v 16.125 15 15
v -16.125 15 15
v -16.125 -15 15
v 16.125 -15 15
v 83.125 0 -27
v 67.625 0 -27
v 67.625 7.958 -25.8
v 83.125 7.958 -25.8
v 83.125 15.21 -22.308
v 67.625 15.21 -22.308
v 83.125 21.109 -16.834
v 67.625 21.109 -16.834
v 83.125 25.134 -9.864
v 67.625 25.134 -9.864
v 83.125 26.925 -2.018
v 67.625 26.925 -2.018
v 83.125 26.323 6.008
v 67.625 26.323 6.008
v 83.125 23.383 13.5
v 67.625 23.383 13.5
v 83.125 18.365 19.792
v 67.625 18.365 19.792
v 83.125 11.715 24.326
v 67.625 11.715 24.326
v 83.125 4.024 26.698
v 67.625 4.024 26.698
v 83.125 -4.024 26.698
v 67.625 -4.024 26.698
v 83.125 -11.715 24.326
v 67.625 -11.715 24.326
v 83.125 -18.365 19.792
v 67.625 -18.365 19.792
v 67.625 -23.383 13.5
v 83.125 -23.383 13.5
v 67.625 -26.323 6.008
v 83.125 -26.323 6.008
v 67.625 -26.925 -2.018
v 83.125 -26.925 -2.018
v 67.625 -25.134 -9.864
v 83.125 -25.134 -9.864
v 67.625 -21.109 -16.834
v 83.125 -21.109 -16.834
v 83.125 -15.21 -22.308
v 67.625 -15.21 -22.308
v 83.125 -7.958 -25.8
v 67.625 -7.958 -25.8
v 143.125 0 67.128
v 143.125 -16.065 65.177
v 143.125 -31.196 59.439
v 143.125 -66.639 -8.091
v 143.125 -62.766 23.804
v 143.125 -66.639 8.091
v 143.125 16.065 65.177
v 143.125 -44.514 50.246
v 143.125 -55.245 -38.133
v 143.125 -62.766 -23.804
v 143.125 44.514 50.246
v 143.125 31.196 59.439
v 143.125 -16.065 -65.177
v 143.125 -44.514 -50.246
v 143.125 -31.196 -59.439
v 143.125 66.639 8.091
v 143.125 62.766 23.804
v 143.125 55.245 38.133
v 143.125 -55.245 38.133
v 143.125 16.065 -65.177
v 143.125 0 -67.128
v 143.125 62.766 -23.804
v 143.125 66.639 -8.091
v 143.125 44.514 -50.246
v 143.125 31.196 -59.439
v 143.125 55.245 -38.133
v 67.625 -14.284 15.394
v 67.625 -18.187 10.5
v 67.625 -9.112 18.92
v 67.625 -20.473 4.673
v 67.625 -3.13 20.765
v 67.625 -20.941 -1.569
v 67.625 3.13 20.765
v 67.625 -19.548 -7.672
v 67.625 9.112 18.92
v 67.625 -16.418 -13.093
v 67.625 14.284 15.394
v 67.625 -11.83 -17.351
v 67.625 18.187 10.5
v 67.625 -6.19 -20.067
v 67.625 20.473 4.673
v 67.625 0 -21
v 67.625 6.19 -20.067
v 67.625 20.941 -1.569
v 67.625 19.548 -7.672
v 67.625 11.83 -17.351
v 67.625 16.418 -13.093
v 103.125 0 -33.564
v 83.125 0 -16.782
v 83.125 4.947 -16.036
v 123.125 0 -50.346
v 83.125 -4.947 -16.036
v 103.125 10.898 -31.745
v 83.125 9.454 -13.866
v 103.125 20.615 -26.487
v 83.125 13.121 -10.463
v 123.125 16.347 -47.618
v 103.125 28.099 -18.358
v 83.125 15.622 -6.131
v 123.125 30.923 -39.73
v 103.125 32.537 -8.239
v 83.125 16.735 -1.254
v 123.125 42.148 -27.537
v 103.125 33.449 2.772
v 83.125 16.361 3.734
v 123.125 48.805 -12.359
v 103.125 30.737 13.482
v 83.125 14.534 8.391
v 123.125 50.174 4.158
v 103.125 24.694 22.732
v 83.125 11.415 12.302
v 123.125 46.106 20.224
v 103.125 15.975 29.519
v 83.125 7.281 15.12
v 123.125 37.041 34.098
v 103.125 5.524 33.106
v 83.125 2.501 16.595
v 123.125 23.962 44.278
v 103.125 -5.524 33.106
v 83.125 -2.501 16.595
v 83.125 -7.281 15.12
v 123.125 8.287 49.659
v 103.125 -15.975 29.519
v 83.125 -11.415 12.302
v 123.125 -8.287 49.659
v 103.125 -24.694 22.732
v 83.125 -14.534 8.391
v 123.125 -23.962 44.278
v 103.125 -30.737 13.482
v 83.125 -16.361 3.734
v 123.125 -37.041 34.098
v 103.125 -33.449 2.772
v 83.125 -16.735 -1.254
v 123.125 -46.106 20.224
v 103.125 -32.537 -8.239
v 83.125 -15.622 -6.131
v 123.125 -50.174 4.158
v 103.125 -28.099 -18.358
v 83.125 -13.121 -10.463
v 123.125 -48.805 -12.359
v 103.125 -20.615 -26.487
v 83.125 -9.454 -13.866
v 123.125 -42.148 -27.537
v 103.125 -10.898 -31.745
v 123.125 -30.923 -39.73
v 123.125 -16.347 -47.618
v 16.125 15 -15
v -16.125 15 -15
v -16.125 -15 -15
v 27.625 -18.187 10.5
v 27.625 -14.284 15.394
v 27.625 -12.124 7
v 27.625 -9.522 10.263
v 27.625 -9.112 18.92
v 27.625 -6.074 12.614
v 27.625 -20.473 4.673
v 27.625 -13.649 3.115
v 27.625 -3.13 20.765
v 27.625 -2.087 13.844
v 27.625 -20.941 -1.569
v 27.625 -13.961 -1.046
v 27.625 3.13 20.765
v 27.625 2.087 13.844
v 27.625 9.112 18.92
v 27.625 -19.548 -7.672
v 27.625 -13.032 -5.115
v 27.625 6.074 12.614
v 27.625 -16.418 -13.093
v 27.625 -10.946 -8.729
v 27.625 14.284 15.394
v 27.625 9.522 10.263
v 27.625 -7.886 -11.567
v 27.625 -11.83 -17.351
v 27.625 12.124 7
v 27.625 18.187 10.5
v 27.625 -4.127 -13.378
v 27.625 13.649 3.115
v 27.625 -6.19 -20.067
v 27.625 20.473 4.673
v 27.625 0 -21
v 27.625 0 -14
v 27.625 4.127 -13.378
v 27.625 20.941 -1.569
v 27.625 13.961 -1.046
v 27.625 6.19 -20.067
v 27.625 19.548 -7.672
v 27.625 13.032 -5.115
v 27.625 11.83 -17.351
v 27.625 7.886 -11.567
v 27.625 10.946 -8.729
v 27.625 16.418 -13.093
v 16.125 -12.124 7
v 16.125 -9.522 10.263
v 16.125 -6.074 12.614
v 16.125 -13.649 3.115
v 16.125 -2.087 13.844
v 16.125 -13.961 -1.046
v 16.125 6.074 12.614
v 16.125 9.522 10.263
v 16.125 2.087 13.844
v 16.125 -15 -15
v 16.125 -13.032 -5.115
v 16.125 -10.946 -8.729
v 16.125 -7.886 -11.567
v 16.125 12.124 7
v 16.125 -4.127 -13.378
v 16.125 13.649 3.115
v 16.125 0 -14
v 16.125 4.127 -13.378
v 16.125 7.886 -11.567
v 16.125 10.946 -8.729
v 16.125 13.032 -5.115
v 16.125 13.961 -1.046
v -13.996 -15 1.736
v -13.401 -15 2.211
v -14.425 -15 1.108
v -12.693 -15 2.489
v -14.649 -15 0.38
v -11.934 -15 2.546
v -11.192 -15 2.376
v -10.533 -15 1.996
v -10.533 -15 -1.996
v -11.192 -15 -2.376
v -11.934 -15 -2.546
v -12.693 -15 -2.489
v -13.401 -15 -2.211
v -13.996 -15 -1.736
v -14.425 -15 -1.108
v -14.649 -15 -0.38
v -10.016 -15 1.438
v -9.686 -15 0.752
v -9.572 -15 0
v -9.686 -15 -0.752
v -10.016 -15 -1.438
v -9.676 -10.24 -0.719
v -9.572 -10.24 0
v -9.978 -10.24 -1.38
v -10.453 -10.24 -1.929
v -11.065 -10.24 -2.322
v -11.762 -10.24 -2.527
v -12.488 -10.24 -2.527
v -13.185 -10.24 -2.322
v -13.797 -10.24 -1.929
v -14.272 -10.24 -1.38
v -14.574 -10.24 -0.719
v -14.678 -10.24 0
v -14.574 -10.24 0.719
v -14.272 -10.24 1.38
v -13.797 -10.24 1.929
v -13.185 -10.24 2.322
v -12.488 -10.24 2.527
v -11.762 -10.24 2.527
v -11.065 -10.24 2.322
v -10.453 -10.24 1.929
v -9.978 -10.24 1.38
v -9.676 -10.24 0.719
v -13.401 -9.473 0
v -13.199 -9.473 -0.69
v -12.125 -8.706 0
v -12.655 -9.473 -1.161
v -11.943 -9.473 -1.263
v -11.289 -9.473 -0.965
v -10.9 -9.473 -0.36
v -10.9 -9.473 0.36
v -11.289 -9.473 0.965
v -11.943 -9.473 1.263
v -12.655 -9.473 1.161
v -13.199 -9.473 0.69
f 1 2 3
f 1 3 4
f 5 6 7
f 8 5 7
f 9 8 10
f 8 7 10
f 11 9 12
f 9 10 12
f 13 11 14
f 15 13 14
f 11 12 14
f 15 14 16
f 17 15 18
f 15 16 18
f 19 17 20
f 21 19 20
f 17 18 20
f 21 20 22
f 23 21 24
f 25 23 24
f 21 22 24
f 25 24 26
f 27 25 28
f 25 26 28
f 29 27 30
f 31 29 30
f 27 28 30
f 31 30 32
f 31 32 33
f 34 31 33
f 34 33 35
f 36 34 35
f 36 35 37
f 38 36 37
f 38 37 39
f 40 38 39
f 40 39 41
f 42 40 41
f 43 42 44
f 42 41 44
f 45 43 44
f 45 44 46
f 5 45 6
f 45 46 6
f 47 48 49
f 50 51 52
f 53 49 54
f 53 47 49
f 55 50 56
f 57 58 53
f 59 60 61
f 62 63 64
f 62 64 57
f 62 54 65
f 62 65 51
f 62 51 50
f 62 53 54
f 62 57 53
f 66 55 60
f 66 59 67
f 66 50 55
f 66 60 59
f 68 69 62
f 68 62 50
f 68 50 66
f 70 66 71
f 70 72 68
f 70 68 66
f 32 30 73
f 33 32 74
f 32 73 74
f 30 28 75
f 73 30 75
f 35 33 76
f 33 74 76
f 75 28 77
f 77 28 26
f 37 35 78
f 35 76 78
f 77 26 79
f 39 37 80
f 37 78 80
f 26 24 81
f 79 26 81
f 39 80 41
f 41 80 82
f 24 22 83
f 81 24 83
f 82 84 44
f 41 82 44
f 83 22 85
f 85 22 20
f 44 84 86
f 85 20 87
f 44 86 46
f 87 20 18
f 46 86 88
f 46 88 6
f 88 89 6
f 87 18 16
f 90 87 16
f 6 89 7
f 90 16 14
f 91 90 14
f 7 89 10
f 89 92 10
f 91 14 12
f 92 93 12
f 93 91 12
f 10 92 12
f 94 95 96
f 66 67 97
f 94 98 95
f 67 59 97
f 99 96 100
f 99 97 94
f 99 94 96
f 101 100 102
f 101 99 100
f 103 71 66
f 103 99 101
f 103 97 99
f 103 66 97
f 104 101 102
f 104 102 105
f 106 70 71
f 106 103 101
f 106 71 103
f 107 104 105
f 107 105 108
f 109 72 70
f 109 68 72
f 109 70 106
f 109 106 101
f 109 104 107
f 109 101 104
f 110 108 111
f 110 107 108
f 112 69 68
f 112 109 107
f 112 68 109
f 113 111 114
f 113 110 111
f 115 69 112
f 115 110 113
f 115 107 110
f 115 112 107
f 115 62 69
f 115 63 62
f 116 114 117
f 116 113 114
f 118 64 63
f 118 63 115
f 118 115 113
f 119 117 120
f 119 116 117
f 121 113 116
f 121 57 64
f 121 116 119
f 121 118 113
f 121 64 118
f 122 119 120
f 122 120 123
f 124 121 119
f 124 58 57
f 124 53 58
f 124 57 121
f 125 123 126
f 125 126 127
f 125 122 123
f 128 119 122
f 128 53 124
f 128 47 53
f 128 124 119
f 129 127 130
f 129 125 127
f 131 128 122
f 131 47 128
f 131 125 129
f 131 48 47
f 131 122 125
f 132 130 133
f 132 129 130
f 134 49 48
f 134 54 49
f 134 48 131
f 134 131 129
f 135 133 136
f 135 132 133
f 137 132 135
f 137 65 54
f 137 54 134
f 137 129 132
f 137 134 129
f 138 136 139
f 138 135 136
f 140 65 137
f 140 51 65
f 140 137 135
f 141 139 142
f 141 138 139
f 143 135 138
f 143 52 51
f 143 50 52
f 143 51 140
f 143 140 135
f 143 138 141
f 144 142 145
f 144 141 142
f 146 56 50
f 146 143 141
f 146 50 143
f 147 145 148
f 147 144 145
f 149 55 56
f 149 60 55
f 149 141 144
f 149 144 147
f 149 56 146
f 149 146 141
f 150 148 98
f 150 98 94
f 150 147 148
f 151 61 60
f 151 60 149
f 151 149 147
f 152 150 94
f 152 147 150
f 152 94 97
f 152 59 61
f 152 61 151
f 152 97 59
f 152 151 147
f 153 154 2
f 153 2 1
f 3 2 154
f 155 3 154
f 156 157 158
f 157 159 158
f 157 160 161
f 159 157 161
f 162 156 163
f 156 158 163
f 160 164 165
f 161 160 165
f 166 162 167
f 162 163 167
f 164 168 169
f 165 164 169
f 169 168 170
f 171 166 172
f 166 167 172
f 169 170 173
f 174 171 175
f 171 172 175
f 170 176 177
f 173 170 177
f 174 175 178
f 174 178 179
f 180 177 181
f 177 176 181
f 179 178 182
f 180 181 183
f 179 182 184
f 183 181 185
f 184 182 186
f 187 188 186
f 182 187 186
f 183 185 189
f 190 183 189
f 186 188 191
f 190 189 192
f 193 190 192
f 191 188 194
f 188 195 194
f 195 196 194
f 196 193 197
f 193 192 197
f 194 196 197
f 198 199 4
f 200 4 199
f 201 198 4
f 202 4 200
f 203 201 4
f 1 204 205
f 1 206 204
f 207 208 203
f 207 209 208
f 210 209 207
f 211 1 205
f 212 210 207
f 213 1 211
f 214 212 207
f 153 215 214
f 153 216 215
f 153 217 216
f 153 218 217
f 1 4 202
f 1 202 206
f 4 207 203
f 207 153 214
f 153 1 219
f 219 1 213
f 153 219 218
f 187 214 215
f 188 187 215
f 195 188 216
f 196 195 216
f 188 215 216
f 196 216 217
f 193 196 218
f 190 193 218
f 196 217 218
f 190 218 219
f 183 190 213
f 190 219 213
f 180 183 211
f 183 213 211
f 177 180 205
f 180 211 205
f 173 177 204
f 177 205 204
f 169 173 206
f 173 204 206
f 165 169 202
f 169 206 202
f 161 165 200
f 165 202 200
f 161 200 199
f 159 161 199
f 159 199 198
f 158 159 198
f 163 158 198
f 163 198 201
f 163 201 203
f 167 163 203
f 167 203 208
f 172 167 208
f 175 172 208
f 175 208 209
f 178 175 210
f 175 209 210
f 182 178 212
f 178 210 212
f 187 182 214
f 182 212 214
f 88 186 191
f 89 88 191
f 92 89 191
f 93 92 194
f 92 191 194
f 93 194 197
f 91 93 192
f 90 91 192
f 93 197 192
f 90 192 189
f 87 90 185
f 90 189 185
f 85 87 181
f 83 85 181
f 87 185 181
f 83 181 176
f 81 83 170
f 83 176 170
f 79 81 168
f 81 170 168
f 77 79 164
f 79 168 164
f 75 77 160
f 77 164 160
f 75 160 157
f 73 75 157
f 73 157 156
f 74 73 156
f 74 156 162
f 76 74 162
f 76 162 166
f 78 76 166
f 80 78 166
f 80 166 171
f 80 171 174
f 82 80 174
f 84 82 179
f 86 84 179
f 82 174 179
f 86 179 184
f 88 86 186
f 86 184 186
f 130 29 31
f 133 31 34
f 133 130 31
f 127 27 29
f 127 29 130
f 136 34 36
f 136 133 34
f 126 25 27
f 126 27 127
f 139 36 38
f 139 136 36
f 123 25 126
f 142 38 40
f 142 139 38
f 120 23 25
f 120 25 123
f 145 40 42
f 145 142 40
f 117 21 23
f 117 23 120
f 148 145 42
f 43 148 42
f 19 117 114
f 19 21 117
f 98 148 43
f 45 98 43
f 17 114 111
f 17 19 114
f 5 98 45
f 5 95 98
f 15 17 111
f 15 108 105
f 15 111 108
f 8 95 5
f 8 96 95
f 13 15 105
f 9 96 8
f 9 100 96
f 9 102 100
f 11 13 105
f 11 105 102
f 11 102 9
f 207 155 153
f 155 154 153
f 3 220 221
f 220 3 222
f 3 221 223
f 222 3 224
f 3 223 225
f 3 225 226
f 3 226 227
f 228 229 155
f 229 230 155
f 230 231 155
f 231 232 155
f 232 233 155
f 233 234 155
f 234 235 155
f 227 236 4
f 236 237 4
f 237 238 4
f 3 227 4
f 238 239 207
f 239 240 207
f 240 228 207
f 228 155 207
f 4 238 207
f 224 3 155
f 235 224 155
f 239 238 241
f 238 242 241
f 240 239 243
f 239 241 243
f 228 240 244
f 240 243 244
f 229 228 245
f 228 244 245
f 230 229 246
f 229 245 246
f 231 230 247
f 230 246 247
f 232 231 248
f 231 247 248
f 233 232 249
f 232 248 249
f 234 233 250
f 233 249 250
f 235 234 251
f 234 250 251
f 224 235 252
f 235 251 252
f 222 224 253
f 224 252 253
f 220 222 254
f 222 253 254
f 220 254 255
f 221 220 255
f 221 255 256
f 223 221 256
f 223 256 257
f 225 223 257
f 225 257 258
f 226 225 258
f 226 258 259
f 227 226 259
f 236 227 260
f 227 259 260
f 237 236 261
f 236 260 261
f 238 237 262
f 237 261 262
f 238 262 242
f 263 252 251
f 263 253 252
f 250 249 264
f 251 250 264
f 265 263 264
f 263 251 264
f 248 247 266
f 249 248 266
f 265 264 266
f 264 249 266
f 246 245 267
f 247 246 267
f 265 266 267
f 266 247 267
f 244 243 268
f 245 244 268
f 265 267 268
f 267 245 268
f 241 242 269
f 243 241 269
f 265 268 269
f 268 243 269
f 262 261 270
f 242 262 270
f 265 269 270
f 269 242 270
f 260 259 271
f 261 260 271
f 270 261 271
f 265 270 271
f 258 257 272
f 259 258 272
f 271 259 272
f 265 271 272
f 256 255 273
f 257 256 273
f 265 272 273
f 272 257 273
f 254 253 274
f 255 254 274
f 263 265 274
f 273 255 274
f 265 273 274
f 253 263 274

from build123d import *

# Parameters (mm, degrees)
SKETCH2_W                       = 32.25
SKETCH2_H                       = 30
BOSS_EXTRUDE1_DEPTH             = 15
SKETCH4_R                       = 14
BOSS_EXTRUDE2_DEPTH             = 11.5
SKETCH5_R                       = 21
BOSS_EXTRUDE3_DEPTH             = 40
SKETCH6_R                       = 27
BOSS_EXTRUDE4_DEPTH             = 15.5
TAP_DRILL_FOR_1_4_20_TAP1_D     = 5.1054
TAP_DRILL_FOR_1_4_20_TAP1_DEPTH = 4.76
TAP_DRILL_FOR_1_4_20_TAP1_TIP   = 1.533816902


with BuildPart() as part:
    # Sketch2 → Boss-Extrude1 (new, symmetric)
    with BuildSketch(Plane(origin=(0, 0, 0), x_dir=(1, 0, 0), z_dir=(0, 1, 0))):
        Rectangle(SKETCH2_W, SKETCH2_H)
    extrude(amount=BOSS_EXTRUDE1_DEPTH, both=True)

    # Sketch4 → Boss-Extrude2 (add)
    with BuildSketch(Plane(origin=(16.125, 0, 0), x_dir=(0, 0, -1), z_dir=(1, 0, 0))):
        Circle(SKETCH4_R)
    extrude(amount=BOSS_EXTRUDE2_DEPTH)

    # Sketch5 → Boss-Extrude3 (add)
    with BuildSketch(Plane(origin=(27.625, 0, 0), x_dir=(0, 0, -1), z_dir=(1, 0, 0))):
        Circle(SKETCH5_R)
    extrude(amount=BOSS_EXTRUDE3_DEPTH)

    # Sketch6 → Boss-Extrude4 (add)
    with BuildSketch(Plane(origin=(67.625, 0, 0), x_dir=(0, 0, -1), z_dir=(1, 0, 0))):
        Circle(SKETCH6_R)
    extrude(amount=BOSS_EXTRUDE4_DEPTH)

    # Sketch12 → Revolve1 (revolve)
    with BuildSketch(Plane.XY, mode=Mode.PRIVATE) as revolve1_sk:
        Polygon((63.125, 0), (143.125, 67.127970494), (143.125, 0), align=None)
    revolve(revolve1_sk.sketch.rotate(Axis((63.125, 0, 0), (1, 0, 0)), 270), axis=Axis((63.125, 0, 0), (1, 0, 0)))

    # Tap Drill for 1/4-20 Tap1
    with Locations(Plane(origin=(0, -15, 0), x_dir=(-1, 0, 0), z_dir=(0, -1, 0))):
        with Locations((12.125, 0)):
            Hole(TAP_DRILL_FOR_1_4_20_TAP1_D / 2, depth=TAP_DRILL_FOR_1_4_20_TAP1_DEPTH)
            with Locations((0, 0, -(TAP_DRILL_FOR_1_4_20_TAP1_DEPTH + TAP_DRILL_FOR_1_4_20_TAP1_TIP / 2))):  # 118° drill point
                Cone(0, TAP_DRILL_FOR_1_4_20_TAP1_D / 2, TAP_DRILL_FOR_1_4_20_TAP1_TIP, mode=Mode.SUBTRACT)


solid = part.part
